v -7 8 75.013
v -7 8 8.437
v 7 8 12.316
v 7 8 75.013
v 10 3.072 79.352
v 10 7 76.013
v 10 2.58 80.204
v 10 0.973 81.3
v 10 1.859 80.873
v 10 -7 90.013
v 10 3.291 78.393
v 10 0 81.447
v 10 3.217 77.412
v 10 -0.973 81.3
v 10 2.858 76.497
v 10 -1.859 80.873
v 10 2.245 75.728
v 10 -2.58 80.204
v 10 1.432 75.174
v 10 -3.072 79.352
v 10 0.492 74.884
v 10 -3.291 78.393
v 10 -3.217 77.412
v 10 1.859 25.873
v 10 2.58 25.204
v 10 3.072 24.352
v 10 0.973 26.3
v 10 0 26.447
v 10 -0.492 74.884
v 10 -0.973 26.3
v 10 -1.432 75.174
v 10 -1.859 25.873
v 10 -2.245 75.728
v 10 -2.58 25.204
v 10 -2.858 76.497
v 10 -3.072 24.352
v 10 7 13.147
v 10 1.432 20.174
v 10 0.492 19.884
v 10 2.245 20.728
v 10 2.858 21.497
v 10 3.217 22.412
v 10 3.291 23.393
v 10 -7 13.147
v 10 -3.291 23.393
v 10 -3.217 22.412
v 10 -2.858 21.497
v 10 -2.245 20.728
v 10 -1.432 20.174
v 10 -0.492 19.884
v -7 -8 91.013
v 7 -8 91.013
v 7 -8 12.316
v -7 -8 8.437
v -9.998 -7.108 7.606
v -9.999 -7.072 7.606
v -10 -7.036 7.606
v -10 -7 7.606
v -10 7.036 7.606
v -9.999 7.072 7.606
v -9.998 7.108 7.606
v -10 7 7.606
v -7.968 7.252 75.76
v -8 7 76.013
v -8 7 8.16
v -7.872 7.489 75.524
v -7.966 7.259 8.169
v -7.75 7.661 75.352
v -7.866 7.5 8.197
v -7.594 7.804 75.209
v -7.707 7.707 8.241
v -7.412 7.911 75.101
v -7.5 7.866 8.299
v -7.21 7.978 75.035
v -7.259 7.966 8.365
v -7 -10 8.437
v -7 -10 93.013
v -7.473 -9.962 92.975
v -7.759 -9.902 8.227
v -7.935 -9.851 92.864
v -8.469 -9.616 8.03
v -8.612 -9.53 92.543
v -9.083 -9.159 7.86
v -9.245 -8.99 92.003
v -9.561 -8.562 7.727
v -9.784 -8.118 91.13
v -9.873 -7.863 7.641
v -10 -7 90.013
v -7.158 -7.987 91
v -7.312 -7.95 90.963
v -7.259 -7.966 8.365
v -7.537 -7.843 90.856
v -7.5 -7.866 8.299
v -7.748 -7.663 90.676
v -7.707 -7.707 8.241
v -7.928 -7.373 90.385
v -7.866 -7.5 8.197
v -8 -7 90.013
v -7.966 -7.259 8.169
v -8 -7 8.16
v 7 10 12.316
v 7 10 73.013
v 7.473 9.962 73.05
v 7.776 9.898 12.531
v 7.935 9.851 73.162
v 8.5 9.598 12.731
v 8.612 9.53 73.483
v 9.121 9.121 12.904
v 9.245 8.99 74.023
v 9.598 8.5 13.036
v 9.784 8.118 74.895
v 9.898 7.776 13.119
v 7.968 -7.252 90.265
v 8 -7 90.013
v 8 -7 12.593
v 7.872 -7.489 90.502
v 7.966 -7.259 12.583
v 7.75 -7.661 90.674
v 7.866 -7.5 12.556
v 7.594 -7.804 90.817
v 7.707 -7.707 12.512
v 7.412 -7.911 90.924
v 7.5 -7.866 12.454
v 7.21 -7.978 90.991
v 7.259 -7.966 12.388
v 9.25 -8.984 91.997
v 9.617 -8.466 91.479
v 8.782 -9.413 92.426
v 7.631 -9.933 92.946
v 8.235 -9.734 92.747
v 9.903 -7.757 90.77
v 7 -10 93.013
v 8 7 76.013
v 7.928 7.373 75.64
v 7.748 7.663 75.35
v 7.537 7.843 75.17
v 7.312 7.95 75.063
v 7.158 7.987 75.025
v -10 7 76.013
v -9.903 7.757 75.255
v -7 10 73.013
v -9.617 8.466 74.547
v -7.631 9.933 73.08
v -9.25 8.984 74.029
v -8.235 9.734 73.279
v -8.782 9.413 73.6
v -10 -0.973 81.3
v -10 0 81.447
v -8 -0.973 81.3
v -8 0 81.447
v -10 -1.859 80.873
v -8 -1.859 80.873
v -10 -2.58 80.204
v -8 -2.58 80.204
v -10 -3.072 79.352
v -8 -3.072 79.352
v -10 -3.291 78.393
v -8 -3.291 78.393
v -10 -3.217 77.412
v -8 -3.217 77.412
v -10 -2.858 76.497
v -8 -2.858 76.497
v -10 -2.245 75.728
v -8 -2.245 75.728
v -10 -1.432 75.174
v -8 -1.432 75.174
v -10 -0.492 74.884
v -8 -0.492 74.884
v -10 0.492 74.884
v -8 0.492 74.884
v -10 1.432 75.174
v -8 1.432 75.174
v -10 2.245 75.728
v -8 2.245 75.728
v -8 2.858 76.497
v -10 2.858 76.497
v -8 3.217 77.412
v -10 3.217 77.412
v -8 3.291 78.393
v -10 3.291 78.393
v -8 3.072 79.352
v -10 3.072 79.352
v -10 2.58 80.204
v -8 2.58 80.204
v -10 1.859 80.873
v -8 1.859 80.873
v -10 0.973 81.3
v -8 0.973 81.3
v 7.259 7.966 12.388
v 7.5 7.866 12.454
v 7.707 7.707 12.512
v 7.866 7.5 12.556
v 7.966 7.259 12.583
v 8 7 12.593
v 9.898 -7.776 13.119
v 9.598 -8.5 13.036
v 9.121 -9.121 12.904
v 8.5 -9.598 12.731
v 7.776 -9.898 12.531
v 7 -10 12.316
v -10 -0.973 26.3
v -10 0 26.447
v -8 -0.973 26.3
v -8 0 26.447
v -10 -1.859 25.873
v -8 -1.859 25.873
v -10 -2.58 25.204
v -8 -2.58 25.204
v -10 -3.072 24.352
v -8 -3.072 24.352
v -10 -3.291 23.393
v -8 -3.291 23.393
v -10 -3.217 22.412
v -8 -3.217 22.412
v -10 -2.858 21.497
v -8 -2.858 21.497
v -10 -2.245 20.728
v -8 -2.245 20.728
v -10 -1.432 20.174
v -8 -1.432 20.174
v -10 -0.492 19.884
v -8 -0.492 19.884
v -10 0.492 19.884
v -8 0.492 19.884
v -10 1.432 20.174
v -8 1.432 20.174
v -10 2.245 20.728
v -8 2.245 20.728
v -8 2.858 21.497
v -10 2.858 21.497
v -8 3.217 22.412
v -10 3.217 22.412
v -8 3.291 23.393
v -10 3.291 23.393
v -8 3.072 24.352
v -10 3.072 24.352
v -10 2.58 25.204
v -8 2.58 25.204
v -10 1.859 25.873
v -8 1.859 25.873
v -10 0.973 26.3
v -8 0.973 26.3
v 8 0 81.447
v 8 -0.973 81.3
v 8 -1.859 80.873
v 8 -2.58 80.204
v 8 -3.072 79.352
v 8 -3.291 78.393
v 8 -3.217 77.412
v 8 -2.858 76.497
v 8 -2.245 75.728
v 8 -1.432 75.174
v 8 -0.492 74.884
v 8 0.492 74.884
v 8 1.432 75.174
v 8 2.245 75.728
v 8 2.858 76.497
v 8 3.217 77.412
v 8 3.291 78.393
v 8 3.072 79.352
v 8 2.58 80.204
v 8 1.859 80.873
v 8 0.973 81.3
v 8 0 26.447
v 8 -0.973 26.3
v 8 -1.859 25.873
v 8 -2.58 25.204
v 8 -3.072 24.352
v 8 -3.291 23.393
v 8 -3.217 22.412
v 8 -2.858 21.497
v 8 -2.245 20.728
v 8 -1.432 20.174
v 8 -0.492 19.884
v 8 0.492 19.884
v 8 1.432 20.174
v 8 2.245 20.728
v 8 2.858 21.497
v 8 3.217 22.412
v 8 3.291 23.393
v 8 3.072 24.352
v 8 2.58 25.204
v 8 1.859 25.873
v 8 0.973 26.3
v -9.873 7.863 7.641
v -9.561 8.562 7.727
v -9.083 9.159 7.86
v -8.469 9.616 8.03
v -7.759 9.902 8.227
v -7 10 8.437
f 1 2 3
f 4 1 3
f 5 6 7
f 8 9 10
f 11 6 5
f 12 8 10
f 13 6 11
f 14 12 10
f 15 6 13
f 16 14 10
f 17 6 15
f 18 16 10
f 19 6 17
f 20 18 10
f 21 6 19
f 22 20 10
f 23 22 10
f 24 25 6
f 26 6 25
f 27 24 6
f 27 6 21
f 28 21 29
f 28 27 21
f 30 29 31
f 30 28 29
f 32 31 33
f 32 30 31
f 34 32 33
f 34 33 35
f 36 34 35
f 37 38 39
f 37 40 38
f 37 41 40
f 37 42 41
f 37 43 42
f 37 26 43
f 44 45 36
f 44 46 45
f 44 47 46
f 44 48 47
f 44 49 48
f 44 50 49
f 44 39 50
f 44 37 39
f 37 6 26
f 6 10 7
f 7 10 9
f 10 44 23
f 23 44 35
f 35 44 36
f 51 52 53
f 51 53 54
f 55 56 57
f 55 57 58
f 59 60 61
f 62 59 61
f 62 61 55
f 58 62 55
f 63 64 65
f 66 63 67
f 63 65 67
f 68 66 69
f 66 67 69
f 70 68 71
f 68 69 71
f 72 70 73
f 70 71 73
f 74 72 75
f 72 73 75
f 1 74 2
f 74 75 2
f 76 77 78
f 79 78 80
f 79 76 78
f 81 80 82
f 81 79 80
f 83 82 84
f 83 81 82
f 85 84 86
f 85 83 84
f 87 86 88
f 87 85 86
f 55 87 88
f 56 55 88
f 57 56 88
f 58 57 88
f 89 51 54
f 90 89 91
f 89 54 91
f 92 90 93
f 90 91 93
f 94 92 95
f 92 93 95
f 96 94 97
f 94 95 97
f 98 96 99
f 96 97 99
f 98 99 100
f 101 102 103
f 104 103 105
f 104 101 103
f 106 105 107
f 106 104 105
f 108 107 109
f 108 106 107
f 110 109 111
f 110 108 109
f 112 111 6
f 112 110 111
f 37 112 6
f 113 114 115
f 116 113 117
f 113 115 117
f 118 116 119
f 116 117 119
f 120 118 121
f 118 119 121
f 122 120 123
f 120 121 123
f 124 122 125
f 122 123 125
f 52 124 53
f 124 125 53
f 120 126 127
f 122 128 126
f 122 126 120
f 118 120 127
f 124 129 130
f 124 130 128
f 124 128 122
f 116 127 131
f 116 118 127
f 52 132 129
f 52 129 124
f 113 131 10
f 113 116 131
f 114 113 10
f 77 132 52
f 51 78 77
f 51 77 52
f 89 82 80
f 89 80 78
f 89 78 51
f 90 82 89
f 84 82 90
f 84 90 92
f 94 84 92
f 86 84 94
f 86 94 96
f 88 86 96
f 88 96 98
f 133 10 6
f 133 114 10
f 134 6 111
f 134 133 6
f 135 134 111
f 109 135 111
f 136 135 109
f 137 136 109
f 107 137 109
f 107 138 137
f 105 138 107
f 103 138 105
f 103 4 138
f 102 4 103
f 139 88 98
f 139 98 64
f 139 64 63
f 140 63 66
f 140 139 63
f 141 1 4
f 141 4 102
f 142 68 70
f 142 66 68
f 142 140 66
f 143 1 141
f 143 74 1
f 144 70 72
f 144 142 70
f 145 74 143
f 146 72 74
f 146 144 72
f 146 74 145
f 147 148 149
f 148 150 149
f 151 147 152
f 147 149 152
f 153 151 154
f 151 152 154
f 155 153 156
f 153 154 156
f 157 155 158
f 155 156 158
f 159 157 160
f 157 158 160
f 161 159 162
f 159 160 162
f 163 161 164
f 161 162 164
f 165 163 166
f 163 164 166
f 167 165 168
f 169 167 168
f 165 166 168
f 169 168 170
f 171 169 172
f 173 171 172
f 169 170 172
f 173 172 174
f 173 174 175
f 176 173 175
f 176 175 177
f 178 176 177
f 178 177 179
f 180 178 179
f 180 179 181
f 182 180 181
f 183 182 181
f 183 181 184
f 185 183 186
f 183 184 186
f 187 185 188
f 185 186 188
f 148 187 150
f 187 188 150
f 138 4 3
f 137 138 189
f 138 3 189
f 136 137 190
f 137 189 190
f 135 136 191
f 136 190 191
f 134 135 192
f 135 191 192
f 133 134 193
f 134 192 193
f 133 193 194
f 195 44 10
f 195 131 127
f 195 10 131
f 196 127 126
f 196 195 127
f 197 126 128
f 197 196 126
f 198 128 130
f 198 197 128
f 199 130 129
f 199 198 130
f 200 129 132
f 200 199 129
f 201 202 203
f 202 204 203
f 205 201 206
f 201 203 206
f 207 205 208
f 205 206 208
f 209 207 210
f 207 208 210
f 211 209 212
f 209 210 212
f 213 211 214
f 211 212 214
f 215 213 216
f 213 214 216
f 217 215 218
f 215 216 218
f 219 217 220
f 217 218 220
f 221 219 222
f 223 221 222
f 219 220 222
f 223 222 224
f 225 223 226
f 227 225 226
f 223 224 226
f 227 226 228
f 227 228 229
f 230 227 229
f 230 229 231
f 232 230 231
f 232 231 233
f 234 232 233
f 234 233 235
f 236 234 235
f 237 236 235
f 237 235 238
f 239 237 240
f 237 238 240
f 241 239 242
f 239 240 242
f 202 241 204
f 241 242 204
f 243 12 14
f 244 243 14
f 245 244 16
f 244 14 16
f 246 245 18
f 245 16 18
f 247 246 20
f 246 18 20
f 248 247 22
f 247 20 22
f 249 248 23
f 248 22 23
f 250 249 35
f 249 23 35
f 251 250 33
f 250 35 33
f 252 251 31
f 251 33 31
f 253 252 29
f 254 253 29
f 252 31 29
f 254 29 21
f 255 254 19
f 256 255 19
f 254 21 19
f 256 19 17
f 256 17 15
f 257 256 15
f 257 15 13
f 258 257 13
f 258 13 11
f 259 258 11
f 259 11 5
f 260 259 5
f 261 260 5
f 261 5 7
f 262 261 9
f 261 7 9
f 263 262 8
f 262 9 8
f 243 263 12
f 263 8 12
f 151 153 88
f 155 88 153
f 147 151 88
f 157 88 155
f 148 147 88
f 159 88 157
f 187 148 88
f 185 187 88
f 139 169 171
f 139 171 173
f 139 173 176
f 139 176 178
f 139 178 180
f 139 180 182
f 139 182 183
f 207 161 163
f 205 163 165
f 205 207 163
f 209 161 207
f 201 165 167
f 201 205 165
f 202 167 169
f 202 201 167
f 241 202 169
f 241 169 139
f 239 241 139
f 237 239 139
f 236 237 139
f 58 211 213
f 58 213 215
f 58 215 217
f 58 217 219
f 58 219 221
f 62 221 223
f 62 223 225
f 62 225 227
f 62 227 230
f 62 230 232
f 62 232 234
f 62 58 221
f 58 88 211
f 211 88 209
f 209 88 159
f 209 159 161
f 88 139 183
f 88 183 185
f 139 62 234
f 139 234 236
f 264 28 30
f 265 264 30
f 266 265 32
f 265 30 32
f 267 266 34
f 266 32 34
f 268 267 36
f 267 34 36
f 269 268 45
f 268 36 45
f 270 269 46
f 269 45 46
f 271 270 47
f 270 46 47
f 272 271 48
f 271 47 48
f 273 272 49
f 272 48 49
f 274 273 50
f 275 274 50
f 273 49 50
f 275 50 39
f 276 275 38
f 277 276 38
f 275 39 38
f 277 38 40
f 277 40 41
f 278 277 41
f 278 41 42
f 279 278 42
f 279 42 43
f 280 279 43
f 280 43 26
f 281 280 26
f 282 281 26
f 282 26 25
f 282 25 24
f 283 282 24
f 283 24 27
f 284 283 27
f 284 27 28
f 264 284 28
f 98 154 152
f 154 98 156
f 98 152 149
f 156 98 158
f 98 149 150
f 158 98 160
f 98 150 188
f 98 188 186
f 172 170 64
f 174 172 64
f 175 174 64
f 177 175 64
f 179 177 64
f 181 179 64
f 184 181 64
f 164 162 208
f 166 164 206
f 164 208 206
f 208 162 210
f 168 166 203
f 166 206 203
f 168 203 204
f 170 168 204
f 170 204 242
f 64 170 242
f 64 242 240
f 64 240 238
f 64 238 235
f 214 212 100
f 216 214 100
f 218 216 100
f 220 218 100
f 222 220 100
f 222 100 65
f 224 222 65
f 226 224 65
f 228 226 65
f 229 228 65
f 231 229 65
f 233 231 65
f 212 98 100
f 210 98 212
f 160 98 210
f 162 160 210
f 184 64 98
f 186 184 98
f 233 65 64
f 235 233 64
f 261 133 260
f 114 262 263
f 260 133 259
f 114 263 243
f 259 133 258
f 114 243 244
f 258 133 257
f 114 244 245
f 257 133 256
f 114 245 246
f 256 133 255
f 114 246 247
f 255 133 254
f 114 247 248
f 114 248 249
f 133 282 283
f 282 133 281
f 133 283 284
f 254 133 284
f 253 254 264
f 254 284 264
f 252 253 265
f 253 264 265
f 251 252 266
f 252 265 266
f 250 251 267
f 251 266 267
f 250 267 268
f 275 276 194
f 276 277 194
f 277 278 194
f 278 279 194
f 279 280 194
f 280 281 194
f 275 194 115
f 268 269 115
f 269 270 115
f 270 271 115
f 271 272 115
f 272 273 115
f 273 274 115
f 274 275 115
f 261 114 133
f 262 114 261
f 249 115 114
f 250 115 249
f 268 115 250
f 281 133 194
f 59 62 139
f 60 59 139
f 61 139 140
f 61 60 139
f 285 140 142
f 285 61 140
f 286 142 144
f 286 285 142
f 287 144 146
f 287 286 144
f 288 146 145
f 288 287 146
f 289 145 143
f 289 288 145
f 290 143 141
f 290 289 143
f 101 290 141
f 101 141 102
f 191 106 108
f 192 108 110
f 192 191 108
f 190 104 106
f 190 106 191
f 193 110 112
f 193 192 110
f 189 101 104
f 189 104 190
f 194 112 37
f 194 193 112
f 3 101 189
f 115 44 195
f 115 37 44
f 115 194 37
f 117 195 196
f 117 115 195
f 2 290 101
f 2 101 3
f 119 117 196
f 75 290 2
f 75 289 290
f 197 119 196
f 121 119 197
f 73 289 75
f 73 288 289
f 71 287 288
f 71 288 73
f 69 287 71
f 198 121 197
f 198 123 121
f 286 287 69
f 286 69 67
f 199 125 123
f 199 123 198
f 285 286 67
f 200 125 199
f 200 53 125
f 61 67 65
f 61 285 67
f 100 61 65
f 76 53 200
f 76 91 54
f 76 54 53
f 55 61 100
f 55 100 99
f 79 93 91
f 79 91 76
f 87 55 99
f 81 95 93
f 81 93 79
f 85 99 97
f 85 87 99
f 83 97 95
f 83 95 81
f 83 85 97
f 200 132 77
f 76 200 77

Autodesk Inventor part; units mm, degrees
ref_plane "Start Plane" through (0, 0, 7.6064) normal (0, 0, 1) x (1, 0, 0)
ref_plane "End Plane" through (0, 0, 93.0129) normal (0, 0, 1) x (1, 0, 0)
sketch "Sketch" plane through (0, 0, 0) normal (0, 0, 1) x (1, 0, 0)
  line L0 (-10, -7) -> (-10, 7)
  line L1 (-7, 10) -> (7, 10)
  line L2 (10, 7) -> (10, -7)
  line L3 (7, -10) -> (-7, -10)
  arc A0 (-10, -7) -> (-7, -10) centre (-7, -7) ccw
  arc A1 (-7, 10) -> (-10, 7) centre (-7, 7) ccw
  arc A2 (10, 7) -> (7, 10) centre (7, 7) ccw
  arc A3 (7, -10) -> (10, -7) centre (7, -7) ccw
  arc A4 (-7, 8) -> (-8, 7) centre (-7, 7) ccw
  line L4 (-7, 8) -> (7, 8)
  arc A5 (8, 7) -> (7, 8) centre (7, 7) ccw
  line L5 (8, 7) -> (8, -7)
  arc A6 (7, -8) -> (8, -7) centre (7, -7) ccw
  line L6 (7, -8) -> (-7, -8)
  arc A7 (-8, -7) -> (-7, -8) centre (-7, -7) ccw
  line L7 (-8, -7) -> (-8, 7)
  line L8 (0, 14.8698) -> (0, -14.8698) construction
  line L9 (-14.8698, 0) -> (14.8698, 0) construction
  dimension "d7" = 3
  dimension "d10" = 20
  dimension "d11" = 20
  dimension "d12" = 2
  dimension "d15" = 10
  dimension "d16" = 10
extrude "Body" add sketch "Sketch" along normal up to surface (85.4065 mm away) from surface at 7.6064
sketch "Sketch3" plane through (0, 0, 0) normal (0, 0, 1) x (1, 0, 0)
  line L0 (0, 0) -> (10, 0)
ref_plane "Work Plane3" through (0, 0, 0) normal (0, -1, 0) x (1, 0, 0)
sketch "Sketch4" plane through (0, 0, 0) normal (0, -1, 0) x (1, 0, 0)
  line L0 (-2, 7.6064) -> (12, 7.6064)
  line L1 (-2, 93.0129) -> (12, 93.0129)
  dimension "d18" = 85.4065
ref_plane "Work Plane4" through (4.0763, -100, 11.5058) normal (0.267, 0, -0.9637) x (-0.9637, 0, -0.267)
split "Split1" plane through (4.0763, -100, 11.5058) removes the side toward (0.267, 0, -0.9637)
ref_plane "Work Plane6" through (0, -10, 93.0129) normal (0, 0.7071, 0.7071) x (1, 0, 0)
split "Split3" plane through (0, -10, 93.0129) removes the side toward (0, 0.7071, 0.7071)
sketch "Sketch7" plane through (8, -7, 12.5928) normal (-1, 0, 0) x (0, 0, 1)
  point P0 (10.554, 7)
hole "Hole3" at (8, 0, 23.1468) direction (1, 0, 0) diameter 6.6 depth 2
sketch "Sketch8" plane through (8, -7, 12.5928) normal (-1, 0, 0) x (0, 0, 1)
  point P0 (65.554, 7)
hole "Hole4" at (8, 0, 78.1468) direction (1, 0, 0) diameter 6.6 depth 2
sketch "Sketch9" plane through (-10, -7, 7.6064) normal (-1, 0, 0) x (0, 0, 1)
  point P0 (15.5404, 7)
hole "Hole5" at (-10, 0, 23.1468) direction (1, 0, 0) diameter 6.6 end through all
sketch "Sketch11" plane through (-10, -7, 7.6064) normal (-1, 0, 0) x (0, 0, 1)
  point P0 (70.5404, 7)
hole "Hole7" at (-10, 0, 78.1468) direction (1, 0, 0) diameter 6.6 end through all
equation "\"d7\" = G_IR"
equation "\"d10\" = G_H"
equation "\"d11\" = G_W"
equation "\"d12\" = G_T"
equation "\"d15\" = 0.5 * d10"
equation "\"d16\" = 0.5 * d11"
equation "\"d3\" = G_L"
equation "\"G_W\" = 20"
equation "\"G_H\" = 20"
equation "\"G_T\" = 2"
equation "\"G_IR\" = 3"
equation "\"G_L\" = d18"
equation "\"G_OFFSET_START\" = -7.60639"
equation "\"d13\" = -G_OFFSET_START"
equation "\"d14\" = G_OFFSET_END + B_L"
equation "\"B_L\" = 83.01292"
equation "\"G_OFFSET_END\" = 10"
properties part number "ISO 12633-2 - 20x20x2 - 85,41" material "Steel, Mild"
